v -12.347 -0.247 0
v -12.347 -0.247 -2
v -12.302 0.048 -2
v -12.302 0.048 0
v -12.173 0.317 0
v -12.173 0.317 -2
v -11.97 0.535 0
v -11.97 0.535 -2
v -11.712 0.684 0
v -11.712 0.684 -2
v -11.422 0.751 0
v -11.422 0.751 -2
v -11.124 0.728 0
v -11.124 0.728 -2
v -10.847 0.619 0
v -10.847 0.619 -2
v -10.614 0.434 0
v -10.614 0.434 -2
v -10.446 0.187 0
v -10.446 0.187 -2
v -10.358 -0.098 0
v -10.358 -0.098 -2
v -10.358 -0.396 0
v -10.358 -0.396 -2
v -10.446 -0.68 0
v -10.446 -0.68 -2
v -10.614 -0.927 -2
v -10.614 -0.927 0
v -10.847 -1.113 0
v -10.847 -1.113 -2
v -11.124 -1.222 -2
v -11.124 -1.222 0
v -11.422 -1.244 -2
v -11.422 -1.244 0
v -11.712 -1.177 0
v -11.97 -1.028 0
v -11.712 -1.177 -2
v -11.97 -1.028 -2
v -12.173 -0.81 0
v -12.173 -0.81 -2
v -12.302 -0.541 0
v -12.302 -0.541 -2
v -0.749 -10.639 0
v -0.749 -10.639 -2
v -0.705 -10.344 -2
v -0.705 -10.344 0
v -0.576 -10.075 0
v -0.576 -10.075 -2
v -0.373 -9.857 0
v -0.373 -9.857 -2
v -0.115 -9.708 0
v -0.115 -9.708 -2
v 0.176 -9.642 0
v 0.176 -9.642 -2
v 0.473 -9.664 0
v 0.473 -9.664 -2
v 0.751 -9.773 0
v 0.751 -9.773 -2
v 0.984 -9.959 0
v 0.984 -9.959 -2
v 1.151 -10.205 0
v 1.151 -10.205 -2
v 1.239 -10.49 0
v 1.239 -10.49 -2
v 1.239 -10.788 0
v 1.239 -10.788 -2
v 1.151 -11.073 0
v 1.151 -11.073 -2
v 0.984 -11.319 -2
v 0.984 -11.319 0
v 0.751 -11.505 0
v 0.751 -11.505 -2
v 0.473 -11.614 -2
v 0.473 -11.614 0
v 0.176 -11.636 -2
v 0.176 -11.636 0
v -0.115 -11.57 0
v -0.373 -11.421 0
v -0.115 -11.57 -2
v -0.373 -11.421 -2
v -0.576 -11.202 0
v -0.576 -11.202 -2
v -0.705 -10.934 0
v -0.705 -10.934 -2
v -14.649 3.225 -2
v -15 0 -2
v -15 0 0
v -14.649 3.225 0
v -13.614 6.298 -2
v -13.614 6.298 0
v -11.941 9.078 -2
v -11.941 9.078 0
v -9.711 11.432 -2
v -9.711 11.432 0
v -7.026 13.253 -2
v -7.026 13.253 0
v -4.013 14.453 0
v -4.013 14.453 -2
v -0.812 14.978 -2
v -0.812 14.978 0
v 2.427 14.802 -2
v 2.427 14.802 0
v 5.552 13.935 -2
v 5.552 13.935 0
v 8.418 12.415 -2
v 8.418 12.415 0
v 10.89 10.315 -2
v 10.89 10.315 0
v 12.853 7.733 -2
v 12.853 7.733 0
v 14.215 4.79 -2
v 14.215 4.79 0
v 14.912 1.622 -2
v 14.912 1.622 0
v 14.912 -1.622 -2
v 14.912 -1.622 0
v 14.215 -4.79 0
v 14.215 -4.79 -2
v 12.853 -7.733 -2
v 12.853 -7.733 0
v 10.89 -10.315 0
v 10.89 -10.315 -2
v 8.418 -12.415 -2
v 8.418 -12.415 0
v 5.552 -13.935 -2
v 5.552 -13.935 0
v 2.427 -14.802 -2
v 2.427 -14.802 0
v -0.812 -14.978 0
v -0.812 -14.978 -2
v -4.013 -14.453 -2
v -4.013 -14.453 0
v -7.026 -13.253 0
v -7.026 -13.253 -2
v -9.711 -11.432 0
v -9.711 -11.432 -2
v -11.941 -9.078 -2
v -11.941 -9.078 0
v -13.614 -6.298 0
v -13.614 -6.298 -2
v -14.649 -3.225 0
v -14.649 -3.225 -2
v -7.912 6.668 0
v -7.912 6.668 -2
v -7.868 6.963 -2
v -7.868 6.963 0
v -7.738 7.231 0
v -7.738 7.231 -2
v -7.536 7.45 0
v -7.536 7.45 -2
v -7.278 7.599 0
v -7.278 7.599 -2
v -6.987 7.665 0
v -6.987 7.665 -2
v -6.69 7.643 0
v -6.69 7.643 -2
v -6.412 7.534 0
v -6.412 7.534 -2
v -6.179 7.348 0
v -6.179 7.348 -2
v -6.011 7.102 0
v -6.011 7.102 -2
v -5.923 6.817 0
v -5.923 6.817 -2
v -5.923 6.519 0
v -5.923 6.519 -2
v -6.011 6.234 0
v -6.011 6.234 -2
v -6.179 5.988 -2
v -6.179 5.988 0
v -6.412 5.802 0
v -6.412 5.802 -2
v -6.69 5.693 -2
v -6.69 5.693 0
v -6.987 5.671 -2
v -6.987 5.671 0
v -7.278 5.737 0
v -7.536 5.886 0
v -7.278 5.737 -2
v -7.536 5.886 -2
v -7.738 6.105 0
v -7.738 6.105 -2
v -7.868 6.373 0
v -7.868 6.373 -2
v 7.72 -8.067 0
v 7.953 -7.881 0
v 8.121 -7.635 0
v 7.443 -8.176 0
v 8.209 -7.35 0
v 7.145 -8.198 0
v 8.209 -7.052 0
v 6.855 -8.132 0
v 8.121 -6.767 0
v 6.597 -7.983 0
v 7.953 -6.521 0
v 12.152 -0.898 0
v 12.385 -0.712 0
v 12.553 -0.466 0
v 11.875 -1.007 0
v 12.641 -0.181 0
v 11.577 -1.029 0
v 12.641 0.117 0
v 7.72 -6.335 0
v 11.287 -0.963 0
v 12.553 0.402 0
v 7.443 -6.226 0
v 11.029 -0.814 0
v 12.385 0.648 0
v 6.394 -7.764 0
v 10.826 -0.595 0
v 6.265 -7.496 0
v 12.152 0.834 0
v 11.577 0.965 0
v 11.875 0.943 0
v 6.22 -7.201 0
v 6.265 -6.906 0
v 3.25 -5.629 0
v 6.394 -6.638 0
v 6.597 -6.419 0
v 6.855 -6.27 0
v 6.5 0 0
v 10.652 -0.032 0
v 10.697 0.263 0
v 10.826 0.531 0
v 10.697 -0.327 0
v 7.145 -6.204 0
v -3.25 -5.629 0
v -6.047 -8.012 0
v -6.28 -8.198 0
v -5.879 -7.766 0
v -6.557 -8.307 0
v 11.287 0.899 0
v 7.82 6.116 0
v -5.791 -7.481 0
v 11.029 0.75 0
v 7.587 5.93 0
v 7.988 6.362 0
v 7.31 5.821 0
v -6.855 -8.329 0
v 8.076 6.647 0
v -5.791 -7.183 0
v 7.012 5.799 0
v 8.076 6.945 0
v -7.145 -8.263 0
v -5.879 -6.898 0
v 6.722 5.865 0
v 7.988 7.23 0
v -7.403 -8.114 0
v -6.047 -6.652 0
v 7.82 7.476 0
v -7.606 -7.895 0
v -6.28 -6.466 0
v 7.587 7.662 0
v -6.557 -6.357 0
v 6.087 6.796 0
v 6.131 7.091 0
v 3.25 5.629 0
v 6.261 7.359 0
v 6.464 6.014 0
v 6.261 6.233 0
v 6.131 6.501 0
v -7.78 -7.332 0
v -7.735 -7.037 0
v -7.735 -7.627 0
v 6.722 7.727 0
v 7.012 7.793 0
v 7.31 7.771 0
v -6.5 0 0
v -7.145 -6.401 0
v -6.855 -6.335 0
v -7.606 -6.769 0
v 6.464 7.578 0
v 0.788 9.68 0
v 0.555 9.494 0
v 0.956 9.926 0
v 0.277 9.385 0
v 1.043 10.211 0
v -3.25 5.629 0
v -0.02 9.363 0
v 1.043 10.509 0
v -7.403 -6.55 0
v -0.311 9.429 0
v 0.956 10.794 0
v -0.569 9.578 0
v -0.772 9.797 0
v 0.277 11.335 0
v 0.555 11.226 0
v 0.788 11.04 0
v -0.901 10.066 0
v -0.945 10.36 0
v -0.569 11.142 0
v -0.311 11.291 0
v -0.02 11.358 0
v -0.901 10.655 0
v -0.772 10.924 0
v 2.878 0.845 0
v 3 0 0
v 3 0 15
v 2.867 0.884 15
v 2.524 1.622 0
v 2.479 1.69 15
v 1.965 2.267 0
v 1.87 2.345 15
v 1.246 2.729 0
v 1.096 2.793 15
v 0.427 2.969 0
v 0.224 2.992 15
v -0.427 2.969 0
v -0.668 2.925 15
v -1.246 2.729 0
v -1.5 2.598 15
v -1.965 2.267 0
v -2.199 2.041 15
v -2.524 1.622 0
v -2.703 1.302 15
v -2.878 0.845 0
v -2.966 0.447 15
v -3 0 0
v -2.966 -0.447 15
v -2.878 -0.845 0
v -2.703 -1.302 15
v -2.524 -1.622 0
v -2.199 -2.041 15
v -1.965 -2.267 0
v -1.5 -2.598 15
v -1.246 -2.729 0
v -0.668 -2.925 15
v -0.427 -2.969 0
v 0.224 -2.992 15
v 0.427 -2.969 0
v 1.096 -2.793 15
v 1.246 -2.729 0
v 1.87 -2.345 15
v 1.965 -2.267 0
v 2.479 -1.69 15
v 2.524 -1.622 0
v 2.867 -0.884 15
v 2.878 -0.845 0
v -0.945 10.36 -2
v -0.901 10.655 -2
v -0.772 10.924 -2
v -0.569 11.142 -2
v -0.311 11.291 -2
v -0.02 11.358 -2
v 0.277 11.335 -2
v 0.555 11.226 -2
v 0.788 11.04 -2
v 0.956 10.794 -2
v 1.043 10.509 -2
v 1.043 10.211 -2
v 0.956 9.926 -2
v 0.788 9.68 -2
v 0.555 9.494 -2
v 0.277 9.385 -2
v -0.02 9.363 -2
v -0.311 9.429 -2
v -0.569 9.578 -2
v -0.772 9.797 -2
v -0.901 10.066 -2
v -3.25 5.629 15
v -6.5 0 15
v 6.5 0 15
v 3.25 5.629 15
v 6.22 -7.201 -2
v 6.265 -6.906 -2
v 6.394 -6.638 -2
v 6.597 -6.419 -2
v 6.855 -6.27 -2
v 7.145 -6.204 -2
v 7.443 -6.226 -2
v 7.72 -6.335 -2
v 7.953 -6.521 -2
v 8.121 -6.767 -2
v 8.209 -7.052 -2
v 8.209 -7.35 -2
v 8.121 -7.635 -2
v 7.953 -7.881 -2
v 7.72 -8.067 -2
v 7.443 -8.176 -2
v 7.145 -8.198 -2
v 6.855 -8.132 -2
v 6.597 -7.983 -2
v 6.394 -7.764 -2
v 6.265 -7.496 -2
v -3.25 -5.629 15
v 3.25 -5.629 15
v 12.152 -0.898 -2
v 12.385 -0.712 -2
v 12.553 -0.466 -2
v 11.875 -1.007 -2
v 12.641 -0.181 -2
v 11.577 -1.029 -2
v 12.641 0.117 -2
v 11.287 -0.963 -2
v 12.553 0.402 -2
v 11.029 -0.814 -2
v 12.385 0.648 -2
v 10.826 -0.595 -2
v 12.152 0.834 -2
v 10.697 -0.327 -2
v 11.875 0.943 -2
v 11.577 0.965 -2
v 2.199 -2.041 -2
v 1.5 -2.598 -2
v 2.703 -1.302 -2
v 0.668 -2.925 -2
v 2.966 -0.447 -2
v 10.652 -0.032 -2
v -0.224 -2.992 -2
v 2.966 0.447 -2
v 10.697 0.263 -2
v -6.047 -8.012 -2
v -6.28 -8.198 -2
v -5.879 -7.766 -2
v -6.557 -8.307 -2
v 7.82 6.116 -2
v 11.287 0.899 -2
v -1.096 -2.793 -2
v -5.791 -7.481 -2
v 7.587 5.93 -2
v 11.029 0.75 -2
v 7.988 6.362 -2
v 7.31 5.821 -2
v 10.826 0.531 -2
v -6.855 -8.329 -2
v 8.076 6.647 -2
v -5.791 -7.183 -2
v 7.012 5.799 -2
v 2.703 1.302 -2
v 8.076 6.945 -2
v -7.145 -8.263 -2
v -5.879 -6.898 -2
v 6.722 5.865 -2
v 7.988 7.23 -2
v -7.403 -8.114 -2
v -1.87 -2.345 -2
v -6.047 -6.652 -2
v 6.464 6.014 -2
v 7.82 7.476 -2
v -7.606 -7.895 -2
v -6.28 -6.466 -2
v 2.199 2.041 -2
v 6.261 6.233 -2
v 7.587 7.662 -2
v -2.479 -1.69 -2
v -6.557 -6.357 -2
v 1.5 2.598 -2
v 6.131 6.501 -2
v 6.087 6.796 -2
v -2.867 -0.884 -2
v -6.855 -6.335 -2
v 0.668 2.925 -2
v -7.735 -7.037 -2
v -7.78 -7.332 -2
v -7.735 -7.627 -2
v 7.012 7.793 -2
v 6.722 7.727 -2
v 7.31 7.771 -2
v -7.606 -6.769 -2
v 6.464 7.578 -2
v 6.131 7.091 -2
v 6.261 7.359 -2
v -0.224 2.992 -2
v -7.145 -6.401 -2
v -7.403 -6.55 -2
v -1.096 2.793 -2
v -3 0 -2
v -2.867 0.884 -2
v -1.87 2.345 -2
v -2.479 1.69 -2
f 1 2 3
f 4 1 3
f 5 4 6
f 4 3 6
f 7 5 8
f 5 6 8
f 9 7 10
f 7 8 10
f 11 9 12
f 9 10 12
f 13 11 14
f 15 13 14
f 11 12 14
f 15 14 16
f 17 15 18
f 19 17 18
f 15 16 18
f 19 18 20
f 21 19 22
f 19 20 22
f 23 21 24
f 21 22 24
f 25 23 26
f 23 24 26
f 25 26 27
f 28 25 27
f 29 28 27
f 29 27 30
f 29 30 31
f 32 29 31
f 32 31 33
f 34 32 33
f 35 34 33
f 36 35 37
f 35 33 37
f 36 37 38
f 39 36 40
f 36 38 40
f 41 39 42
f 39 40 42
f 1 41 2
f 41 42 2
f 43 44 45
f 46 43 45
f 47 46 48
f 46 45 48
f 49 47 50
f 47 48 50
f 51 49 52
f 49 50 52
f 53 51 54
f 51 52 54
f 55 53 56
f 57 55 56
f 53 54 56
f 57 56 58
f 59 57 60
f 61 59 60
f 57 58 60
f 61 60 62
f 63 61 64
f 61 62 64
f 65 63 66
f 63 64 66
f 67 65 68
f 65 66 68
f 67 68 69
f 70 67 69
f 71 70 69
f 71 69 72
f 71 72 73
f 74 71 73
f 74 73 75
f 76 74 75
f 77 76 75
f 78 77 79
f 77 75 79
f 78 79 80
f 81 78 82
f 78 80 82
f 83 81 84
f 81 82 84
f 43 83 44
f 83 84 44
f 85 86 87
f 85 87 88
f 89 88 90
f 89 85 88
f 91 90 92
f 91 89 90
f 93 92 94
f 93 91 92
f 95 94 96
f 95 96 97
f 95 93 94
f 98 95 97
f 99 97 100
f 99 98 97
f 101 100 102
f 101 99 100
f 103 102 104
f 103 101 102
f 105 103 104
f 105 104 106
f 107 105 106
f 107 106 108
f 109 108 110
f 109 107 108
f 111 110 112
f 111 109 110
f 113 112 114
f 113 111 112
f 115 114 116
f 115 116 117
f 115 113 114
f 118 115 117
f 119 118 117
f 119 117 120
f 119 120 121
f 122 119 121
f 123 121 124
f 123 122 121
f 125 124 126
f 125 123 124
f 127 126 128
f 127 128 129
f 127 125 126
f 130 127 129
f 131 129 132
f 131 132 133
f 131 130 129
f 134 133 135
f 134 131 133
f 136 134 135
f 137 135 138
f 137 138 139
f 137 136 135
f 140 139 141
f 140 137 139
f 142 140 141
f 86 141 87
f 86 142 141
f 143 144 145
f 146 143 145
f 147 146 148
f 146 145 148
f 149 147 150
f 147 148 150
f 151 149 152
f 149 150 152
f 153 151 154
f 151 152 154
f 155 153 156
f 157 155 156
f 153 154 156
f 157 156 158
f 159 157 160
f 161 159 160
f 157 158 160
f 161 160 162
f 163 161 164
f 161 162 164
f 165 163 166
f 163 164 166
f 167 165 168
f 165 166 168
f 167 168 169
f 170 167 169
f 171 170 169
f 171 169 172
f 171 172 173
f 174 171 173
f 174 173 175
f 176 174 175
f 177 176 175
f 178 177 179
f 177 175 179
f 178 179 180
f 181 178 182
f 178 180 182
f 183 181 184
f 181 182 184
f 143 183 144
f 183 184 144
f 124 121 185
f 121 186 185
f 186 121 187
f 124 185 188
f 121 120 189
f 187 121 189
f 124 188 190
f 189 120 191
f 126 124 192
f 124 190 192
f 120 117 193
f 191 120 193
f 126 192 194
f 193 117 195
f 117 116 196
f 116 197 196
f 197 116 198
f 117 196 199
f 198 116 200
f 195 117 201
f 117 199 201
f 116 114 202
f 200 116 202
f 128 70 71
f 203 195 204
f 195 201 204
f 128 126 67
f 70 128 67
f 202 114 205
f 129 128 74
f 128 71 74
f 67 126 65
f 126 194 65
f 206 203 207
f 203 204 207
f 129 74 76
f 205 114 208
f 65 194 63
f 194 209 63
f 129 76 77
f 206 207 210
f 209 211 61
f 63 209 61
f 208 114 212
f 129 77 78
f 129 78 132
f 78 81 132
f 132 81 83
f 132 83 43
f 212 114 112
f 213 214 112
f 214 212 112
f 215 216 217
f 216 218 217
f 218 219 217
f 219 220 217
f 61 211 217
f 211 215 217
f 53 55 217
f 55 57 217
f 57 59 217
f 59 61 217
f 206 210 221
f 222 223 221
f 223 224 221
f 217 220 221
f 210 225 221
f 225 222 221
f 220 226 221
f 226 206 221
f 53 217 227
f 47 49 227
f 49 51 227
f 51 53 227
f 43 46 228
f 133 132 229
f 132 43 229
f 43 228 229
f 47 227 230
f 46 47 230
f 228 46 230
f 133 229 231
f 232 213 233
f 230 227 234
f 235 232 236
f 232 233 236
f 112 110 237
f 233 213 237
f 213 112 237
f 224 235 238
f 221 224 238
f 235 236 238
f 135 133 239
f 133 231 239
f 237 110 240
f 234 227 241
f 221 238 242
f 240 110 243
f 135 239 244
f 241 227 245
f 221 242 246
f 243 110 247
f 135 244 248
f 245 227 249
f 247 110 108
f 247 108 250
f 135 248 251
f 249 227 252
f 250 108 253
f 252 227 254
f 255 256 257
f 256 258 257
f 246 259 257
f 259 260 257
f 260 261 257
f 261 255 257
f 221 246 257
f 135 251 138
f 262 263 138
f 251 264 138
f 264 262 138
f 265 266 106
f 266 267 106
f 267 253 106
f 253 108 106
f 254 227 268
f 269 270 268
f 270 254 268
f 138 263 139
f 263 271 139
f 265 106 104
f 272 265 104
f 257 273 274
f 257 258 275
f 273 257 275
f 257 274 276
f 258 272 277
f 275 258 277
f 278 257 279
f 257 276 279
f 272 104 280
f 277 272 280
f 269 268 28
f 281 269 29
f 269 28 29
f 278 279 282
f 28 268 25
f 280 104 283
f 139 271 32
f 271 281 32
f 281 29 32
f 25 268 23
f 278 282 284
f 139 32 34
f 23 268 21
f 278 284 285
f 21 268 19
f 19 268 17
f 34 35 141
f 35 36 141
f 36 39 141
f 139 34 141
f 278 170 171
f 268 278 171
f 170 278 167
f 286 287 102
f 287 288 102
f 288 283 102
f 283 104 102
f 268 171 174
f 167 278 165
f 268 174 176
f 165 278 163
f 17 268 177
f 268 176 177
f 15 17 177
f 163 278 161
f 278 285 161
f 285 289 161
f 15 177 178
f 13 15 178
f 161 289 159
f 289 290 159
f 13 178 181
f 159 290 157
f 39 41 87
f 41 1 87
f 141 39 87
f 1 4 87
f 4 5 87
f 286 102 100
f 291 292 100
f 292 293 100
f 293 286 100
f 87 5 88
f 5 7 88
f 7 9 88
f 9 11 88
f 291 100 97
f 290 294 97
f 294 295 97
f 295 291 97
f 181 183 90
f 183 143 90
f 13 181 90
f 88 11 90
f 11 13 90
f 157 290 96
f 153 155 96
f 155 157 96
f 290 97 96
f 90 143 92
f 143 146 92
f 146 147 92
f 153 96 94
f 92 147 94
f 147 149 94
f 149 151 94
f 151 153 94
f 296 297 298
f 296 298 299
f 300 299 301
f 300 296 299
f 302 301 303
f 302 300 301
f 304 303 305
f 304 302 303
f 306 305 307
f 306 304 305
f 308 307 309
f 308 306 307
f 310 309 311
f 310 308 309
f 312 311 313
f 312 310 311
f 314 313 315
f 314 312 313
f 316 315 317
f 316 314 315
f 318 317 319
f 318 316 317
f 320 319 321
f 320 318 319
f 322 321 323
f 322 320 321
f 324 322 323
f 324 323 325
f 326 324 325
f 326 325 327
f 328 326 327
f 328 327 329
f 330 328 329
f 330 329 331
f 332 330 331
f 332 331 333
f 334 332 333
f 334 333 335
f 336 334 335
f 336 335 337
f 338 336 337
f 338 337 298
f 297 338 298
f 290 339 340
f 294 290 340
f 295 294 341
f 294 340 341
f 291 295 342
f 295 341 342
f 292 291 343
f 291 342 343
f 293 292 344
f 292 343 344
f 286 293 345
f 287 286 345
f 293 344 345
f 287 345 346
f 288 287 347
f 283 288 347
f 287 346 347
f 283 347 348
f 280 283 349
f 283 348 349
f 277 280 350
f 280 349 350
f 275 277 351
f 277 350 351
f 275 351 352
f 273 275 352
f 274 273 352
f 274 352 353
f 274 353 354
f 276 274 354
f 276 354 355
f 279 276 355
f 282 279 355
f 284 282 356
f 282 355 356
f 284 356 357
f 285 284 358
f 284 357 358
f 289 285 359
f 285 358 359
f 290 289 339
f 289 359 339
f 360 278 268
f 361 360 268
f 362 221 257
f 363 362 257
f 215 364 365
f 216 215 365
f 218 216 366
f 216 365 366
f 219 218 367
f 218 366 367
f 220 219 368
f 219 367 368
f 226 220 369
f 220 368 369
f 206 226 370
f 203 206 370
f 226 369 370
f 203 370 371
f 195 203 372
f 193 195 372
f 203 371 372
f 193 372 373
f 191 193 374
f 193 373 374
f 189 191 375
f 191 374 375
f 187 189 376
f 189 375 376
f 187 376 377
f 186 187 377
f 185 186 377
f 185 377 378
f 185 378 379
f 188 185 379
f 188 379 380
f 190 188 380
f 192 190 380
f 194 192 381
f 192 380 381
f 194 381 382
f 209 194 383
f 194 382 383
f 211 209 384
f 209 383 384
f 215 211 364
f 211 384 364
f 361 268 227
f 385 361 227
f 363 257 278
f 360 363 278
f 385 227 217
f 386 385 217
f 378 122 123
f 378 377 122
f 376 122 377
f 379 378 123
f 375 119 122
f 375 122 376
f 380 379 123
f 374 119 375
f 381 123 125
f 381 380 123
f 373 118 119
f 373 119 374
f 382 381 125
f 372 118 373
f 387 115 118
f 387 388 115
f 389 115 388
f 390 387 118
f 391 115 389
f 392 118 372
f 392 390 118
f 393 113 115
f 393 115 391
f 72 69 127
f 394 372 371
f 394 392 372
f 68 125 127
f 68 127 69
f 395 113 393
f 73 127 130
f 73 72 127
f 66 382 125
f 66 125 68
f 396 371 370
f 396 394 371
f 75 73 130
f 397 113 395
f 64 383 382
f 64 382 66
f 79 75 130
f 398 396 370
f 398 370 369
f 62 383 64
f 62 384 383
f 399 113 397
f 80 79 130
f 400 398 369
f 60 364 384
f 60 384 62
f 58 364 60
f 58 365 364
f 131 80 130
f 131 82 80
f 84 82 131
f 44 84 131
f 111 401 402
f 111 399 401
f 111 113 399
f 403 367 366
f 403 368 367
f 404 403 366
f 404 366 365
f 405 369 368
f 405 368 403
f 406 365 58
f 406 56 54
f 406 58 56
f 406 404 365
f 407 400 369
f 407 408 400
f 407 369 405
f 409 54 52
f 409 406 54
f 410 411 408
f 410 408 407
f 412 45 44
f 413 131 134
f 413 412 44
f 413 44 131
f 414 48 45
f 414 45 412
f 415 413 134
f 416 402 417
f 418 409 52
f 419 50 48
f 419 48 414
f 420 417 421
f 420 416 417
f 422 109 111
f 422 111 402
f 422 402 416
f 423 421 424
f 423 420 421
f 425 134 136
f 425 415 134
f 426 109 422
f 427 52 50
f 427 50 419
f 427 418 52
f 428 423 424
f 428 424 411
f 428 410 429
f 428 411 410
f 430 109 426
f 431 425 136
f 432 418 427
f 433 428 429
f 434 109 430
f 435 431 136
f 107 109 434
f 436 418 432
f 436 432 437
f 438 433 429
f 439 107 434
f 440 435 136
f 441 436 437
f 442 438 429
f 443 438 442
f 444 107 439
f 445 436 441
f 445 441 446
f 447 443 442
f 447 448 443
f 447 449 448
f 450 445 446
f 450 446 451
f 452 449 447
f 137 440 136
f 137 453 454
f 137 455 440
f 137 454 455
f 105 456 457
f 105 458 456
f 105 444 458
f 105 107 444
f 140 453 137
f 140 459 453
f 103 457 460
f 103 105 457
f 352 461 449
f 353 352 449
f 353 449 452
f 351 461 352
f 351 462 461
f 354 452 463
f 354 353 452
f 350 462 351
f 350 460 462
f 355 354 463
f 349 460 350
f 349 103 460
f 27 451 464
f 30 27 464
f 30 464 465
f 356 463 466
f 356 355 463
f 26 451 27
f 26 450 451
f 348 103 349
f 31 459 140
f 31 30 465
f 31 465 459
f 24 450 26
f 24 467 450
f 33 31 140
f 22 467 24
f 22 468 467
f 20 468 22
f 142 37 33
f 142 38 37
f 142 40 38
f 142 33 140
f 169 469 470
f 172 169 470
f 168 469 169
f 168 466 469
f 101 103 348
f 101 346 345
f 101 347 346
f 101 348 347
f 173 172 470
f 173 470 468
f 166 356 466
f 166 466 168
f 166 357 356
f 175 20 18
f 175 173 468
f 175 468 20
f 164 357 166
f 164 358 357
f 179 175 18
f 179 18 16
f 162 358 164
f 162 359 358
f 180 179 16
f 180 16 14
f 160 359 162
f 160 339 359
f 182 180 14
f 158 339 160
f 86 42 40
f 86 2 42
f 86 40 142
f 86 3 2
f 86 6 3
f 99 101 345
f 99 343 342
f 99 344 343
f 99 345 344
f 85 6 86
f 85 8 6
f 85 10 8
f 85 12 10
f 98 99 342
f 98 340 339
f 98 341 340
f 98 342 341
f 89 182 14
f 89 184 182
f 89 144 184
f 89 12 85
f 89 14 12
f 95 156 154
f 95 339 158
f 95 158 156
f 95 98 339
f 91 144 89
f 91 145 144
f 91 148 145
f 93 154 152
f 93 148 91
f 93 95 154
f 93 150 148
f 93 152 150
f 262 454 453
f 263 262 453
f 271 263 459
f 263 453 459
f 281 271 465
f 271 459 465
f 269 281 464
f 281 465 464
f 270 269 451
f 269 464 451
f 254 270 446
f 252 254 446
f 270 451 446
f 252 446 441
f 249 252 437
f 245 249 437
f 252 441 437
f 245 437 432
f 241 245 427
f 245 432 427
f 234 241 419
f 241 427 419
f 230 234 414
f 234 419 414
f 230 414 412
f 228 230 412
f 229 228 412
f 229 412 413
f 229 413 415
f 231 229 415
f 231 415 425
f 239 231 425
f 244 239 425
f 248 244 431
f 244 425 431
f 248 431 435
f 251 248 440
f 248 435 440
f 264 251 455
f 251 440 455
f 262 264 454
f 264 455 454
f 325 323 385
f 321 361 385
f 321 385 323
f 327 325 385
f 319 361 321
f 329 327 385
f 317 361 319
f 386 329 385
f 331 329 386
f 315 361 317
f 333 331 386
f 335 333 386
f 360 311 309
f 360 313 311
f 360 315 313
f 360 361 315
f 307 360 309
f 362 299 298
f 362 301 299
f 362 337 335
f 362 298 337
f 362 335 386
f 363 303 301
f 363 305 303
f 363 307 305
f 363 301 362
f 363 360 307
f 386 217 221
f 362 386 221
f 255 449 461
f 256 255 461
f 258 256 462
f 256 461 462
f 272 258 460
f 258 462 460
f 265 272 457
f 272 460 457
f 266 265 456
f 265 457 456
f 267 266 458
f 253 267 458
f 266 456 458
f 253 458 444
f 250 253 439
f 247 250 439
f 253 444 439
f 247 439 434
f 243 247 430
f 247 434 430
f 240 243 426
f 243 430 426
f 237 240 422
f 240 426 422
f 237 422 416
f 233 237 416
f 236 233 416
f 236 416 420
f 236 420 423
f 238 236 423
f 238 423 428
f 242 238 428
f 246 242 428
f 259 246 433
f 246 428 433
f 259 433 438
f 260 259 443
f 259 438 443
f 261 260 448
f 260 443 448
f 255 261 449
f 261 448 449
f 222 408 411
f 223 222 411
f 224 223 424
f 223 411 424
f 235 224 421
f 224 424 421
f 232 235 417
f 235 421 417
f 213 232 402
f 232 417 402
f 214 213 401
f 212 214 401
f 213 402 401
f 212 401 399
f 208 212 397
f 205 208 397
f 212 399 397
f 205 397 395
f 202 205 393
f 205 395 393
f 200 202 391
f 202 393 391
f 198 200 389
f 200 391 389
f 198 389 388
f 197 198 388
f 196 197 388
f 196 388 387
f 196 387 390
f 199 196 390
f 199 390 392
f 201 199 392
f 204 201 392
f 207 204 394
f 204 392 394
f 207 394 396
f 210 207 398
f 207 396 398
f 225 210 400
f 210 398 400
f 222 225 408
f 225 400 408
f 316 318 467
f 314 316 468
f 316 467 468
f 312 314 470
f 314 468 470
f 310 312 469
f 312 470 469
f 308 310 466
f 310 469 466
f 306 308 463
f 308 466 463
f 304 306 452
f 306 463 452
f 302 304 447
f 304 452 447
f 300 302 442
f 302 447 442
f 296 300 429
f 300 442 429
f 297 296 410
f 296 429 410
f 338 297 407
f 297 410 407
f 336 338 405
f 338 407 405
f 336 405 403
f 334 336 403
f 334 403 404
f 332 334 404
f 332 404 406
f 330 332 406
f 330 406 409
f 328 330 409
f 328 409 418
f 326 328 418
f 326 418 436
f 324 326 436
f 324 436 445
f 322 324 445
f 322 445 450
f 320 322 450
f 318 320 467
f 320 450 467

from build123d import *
from build123d.topology import SkipClean

# Parameters (mm, degrees)
SKETCH_1_R      = 3
EXTRUDE_1_DEPTH = 15
EXTRUDE_START   = 2
SKETCH_2_R      = 15
SKETCH_2_R_2    = 3
SKETCH_2_R_3    = 1
EXTRUDE_2_DEPTH = 2


with BuildPart() as part:
    # 草图1 → 凸台-拉伸1 (new body)
    with BuildSketch(Plane.XY):
        Polygon((-3.25, -5.629165125), (3.25, -5.629165125), (6.5, 0), (3.25, 5.629165125), (-3.25, 5.629165125), (-6.5, 0), align=None)
        Circle(SKETCH_1_R, mode=Mode.SUBTRACT)
    extrude(amount=EXTRUDE_1_DEPTH)

    # 草图2 → 凸台-拉伸2 (add)
    with SkipClean():  # the faces are left unmerged after this step: merging them gives an invalid solid
        with BuildSketch(Plane(origin=(0, 0, 0), x_dir=(-1, 0, 0), z_dir=(0, 0, -1)).offset(EXTRUDE_START)):
            Circle(SKETCH_2_R)
            Circle(SKETCH_2_R_2, mode=Mode.SUBTRACT)
            with Locations((-0.054658846, 10.360319416)):
                Circle(SKETCH_2_R_3, mode=Mode.SUBTRACT)
            with Locations((6.912201484, 6.667909711)):
                Circle(SKETCH_2_R_3, mode=Mode.SUBTRACT)
            with Locations((11.346782596, -0.246606579)):
                Circle(SKETCH_2_R_3, mode=Mode.SUBTRACT)
            with Locations((6.779857889, -7.331892684)):
                Circle(SKETCH_2_R_3, mode=Mode.SUBTRACT)
            with Locations((-0.25051923, -10.6387672)):
                Circle(SKETCH_2_R_3, mode=Mode.SUBTRACT)
            with Locations((-7.220104111, -7.200993699)):
                Circle(SKETCH_2_R_3, mode=Mode.SUBTRACT)
            with Locations((-11.652217031, -0.032092826)):
                Circle(SKETCH_2_R_3, mode=Mode.SUBTRACT)
            with Locations((-7.087024538, 6.795828302)):
                Circle(SKETCH_2_R_3, mode=Mode.SUBTRACT)
        extrude(amount=-EXTRUDE_2_DEPTH)


solid = part.part
